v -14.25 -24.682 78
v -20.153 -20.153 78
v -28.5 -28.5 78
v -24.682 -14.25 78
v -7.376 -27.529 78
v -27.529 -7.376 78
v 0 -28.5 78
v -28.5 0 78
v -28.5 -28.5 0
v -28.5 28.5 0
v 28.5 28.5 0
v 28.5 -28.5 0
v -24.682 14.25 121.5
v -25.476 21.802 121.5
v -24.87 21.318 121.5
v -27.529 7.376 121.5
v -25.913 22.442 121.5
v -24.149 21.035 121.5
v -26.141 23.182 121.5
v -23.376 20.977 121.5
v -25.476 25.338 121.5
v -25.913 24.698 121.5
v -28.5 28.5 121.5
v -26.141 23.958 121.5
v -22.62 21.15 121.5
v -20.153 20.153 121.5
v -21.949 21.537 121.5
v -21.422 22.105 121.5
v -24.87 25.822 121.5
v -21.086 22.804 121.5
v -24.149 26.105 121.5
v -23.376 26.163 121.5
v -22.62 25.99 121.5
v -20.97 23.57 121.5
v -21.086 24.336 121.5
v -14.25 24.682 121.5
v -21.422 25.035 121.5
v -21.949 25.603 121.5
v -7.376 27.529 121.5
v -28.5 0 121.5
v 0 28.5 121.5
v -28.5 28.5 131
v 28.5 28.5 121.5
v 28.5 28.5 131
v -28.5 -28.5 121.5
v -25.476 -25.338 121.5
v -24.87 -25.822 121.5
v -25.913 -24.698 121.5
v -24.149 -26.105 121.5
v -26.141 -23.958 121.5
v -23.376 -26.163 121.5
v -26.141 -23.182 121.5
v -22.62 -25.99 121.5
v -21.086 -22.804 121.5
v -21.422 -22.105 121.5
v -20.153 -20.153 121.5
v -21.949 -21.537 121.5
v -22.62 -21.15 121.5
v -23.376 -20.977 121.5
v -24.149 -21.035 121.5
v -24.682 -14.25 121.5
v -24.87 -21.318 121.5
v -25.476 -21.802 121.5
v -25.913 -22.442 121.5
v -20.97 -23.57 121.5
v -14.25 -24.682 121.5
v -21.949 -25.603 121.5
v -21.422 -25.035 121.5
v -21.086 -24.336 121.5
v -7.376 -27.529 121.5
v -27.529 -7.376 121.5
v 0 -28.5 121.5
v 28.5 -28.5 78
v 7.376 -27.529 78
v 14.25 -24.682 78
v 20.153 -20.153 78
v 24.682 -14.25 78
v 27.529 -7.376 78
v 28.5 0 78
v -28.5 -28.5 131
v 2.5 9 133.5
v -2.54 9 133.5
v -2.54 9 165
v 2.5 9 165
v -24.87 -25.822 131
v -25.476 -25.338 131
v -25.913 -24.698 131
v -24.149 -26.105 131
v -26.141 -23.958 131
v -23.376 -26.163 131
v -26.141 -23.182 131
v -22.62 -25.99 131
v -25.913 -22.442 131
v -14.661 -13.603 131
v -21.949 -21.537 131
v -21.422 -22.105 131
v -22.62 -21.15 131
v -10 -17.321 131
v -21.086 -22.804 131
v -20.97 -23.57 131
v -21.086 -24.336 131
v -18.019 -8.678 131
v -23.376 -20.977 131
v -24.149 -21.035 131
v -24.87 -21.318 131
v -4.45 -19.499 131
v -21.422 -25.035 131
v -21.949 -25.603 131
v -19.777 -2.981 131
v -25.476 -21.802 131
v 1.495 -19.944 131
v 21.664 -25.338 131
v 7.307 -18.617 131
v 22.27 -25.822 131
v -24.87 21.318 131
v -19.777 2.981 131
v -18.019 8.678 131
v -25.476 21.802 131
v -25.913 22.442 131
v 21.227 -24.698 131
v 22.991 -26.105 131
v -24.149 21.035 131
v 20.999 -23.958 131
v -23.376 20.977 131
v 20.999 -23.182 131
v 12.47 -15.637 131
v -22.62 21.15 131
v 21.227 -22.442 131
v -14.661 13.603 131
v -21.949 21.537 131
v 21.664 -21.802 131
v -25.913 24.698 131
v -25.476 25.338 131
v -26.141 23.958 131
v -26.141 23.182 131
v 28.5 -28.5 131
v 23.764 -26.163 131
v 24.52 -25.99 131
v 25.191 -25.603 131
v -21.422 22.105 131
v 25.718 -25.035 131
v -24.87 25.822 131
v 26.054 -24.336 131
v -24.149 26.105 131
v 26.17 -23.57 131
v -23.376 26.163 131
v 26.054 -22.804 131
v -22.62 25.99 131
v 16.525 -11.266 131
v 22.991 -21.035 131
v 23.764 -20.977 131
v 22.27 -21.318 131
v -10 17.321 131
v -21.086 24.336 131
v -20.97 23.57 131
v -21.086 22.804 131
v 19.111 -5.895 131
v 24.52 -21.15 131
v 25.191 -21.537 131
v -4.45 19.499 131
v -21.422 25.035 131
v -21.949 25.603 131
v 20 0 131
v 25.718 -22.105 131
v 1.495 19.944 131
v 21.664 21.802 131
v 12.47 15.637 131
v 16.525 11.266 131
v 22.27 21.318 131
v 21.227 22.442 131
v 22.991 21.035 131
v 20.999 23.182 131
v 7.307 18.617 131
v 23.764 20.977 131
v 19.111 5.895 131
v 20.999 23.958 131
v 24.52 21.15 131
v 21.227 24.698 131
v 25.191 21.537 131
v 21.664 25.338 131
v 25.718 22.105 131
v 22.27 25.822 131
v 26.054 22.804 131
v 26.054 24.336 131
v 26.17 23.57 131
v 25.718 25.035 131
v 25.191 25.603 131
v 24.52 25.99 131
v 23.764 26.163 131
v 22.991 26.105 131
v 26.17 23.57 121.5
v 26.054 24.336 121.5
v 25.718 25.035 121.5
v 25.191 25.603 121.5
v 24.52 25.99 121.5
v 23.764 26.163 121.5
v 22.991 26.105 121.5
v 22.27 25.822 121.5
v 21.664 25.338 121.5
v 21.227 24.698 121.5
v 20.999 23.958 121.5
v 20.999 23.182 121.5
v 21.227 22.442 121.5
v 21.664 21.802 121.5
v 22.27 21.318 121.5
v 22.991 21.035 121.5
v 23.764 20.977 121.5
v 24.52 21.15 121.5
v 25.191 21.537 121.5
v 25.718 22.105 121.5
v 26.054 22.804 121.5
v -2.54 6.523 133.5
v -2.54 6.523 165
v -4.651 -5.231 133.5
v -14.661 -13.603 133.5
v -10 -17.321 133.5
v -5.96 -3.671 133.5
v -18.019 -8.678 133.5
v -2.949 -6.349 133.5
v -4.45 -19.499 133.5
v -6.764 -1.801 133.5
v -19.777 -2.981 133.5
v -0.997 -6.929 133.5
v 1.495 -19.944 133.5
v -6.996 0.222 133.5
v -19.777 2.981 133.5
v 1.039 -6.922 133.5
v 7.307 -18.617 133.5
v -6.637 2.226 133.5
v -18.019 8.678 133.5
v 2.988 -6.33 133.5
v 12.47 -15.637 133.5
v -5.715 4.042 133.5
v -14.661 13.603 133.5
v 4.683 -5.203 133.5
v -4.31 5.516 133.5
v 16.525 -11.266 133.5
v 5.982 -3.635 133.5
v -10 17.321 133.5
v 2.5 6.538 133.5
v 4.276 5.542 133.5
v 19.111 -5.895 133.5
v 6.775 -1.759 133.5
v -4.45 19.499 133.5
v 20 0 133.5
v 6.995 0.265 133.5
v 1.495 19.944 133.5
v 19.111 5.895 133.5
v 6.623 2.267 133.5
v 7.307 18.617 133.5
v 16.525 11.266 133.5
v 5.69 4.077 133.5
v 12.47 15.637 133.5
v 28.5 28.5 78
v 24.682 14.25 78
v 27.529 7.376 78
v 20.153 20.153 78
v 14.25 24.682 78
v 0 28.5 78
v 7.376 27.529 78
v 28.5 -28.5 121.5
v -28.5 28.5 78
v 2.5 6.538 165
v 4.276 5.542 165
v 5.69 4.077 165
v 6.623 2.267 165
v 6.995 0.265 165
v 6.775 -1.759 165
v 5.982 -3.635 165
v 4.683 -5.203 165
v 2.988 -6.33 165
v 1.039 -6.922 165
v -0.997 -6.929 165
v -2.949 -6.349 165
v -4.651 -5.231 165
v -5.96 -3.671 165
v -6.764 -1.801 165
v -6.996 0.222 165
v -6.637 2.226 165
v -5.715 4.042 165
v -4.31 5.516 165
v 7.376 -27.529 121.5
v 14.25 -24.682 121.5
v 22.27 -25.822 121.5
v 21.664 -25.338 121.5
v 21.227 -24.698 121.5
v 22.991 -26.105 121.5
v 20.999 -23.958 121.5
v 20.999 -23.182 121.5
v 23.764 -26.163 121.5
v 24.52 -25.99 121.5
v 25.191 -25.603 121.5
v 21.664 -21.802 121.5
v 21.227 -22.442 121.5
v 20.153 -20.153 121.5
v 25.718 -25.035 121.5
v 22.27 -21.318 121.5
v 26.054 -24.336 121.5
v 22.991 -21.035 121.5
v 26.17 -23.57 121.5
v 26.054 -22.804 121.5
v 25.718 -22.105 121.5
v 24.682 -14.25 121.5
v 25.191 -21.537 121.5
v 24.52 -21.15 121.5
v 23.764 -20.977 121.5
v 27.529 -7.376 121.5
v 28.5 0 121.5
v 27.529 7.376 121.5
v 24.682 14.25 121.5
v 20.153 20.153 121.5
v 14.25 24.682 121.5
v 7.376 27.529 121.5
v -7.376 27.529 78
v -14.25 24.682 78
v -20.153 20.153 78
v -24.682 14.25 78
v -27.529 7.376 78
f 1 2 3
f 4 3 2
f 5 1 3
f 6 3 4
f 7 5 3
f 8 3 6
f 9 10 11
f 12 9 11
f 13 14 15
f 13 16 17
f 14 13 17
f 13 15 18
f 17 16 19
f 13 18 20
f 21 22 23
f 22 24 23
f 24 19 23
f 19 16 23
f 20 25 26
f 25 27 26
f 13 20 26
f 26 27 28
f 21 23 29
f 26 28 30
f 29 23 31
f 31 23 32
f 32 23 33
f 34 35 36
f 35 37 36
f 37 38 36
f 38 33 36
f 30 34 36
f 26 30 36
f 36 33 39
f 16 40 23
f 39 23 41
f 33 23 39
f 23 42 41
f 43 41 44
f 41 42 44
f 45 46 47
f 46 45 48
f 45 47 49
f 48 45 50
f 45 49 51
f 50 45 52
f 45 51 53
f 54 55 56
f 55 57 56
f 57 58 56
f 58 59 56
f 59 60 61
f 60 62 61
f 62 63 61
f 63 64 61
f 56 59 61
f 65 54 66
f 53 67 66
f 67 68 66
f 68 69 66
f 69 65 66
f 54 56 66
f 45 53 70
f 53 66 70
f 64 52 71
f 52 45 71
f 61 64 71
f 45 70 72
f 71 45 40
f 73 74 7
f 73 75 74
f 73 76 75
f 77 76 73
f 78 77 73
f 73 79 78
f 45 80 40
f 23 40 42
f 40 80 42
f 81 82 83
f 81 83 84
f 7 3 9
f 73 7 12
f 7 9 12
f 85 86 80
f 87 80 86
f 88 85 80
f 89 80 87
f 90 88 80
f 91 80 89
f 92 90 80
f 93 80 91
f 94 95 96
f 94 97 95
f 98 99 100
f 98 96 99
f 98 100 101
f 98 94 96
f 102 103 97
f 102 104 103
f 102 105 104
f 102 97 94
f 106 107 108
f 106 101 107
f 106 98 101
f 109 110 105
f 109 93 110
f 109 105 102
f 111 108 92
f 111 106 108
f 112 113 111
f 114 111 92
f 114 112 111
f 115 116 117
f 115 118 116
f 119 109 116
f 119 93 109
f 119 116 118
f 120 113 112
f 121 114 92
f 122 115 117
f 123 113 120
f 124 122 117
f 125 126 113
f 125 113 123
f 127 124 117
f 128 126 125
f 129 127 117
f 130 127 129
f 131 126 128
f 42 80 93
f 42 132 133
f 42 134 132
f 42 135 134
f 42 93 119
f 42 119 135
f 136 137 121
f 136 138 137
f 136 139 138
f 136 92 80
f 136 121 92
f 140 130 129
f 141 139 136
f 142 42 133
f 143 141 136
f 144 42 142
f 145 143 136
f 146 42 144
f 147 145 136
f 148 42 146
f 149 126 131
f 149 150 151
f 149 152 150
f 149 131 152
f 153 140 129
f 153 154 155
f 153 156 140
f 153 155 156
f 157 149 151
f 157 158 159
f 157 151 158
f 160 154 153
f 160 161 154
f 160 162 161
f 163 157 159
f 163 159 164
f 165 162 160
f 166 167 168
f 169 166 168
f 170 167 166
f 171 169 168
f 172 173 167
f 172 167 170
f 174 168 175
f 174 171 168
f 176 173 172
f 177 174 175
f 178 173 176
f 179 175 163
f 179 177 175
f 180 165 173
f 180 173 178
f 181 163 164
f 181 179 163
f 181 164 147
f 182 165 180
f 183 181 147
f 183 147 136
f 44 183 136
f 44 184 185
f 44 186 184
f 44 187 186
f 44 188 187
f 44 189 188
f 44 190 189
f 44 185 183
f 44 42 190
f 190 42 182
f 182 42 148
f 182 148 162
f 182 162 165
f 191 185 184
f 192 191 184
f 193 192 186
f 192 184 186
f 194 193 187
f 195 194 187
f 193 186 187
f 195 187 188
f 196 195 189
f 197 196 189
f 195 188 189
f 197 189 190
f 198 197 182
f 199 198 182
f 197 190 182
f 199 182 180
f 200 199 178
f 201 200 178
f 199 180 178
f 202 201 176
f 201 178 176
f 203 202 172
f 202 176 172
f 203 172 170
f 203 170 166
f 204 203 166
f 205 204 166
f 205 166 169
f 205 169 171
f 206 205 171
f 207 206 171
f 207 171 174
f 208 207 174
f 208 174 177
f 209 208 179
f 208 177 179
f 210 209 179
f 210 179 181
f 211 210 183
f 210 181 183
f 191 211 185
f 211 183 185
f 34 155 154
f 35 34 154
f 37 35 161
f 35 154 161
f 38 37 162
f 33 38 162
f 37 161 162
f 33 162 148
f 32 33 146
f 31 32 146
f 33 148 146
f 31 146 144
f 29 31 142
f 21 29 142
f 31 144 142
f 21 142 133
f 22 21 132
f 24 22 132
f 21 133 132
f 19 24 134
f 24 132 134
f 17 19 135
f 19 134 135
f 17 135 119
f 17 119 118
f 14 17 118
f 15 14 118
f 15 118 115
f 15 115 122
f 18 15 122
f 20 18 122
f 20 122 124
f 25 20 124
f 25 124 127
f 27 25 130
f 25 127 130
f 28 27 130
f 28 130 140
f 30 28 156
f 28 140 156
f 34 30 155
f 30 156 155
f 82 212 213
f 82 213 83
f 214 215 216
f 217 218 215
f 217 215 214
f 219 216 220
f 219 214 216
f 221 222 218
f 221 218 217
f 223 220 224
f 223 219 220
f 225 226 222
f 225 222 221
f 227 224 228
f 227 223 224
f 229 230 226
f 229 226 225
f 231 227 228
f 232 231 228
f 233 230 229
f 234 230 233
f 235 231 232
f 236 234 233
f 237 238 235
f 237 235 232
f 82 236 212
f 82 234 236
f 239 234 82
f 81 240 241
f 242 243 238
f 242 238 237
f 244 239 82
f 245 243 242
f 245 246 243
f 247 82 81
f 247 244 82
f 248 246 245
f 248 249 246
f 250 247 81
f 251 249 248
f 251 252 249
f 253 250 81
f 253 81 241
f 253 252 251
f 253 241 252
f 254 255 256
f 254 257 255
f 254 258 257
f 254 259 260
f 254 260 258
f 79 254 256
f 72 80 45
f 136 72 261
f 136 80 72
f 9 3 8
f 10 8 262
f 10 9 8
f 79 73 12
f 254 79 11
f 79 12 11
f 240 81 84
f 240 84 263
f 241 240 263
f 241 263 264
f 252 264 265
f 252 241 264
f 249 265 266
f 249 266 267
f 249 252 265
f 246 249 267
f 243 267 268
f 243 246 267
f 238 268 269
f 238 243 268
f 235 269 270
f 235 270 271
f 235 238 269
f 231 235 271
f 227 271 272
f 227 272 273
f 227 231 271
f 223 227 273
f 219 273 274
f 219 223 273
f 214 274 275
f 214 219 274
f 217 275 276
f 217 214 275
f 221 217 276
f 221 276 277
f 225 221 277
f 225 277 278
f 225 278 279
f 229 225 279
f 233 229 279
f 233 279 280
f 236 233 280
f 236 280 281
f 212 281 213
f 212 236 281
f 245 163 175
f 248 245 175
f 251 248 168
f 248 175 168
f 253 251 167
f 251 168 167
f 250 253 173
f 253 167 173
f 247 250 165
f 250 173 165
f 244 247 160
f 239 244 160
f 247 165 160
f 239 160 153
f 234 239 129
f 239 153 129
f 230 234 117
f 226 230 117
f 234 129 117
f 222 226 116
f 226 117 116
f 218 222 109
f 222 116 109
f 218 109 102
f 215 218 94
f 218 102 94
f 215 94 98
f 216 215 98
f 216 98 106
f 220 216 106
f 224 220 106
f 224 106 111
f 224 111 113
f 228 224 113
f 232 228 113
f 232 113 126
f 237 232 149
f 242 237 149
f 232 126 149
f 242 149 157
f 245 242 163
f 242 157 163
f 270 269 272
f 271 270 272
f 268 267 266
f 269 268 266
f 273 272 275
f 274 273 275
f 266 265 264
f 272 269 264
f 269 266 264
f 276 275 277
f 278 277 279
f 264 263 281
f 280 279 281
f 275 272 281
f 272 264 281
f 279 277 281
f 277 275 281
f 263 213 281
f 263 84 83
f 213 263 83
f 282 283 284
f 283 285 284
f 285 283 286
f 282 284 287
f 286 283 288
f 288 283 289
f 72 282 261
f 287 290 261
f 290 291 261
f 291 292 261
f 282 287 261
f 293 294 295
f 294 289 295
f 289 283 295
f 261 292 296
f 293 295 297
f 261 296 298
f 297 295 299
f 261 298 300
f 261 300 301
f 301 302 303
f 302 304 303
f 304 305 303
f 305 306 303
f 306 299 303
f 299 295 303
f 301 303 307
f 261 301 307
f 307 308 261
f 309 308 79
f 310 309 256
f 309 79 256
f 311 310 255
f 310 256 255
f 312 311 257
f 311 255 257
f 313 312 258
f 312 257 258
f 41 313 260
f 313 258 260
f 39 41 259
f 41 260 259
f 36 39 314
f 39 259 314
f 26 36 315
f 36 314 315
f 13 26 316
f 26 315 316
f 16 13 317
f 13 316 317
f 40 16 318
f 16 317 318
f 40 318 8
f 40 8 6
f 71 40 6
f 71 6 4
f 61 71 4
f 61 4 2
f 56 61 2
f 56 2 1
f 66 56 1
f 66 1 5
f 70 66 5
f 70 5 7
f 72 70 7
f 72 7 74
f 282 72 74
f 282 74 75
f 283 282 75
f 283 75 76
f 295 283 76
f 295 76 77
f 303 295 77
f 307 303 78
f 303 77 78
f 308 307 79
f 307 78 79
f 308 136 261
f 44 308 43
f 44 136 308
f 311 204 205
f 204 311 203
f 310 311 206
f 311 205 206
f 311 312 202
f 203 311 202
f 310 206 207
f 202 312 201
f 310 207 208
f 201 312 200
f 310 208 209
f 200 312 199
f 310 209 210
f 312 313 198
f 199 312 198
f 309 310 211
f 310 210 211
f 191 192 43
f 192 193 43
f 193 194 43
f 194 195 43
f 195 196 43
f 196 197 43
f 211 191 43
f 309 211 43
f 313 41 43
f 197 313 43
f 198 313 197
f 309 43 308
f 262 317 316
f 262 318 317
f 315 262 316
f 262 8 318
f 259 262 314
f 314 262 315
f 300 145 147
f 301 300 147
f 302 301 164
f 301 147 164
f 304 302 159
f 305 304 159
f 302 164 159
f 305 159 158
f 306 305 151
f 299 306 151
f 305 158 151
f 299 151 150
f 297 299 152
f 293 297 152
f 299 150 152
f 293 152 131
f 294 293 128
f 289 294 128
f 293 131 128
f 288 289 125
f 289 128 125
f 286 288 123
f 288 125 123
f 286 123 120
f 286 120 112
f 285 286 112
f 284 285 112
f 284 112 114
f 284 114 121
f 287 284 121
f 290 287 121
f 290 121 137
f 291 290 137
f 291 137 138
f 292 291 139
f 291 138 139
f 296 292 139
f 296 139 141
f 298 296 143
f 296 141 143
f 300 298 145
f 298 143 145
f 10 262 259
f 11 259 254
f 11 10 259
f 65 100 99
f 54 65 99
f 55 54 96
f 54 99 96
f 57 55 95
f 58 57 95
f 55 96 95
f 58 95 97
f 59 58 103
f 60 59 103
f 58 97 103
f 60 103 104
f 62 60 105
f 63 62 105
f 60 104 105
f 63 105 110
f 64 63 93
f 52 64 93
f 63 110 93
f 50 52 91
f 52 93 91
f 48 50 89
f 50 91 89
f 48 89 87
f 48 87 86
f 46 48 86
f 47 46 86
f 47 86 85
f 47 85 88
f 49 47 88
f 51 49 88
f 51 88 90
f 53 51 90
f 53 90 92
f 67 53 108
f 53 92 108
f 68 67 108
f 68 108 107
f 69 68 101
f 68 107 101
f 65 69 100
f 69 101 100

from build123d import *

# Parameters (mm, degrees)
SKETCH_1_W          = 57
SKETCH_1_H          = 57
EXTRUDE_1_DEPTH     = 78
SKETCH_2_R          = 28.5
EXTRUDE_2_DEPTH     = 53
SKETCH_3_R          = 20
EXTRUDE_3_DEPTH     = 2.5
EXTRUDE_4_DEPTH     = 31.5
SKETCH_5_R          = 2
CUT_EXTRUDE_1_DEPTH = 4
SKETCH_6_W          = 57
SKETCH_6_H          = 57
SKETCH_6_R          = 2.6
EXTRUDE_5_DEPTH     = 9.5


with BuildPart() as part:
    # 草图1 → 凸台-拉伸1 (new body)
    with BuildSketch(Plane.XY):
        Rectangle(SKETCH_1_W, SKETCH_1_H)
    extrude(amount=EXTRUDE_1_DEPTH)

    # 草图2 → 凸台-拉伸2 (add)
    with BuildSketch(Plane.XY.offset(78)):
        Circle(SKETCH_2_R)
    extrude(amount=EXTRUDE_2_DEPTH)

    # 草图3 → 凸台-拉伸3 (add)
    with BuildSketch(Plane.XY.offset(131)):
        Circle(SKETCH_3_R)
    extrude(amount=EXTRUDE_3_DEPTH)

    # 草图4 → 凸台-拉伸4 (add)
    with BuildSketch(Plane.XY.offset(133.5)):
        with BuildLine():
            Line((0, 9), (2.5, 9))
            Line((2.5, 9), (2.5, 6.538348415))
            ThreePointArc((2.5, 6.538348415), (0.021437338, -6.999967174), (-2.54, 6.522913459))
            Line((-2.54, 6.522913459), (-2.54, 9))
            Line((-2.54, 9), (0, 9))
        make_face()
    extrude(amount=EXTRUDE_4_DEPTH)

    # 草图5 → 切除-拉伸1 (cut)
    with BuildSketch(Plane.XY.offset(131)):
        with Locations((0, -17.5)):
            Circle(SKETCH_5_R)
        with Locations((-17.5, 0)):
            Circle(SKETCH_5_R)
        with Locations((0, 17.5)):
            Circle(SKETCH_5_R)
        with Locations((17.5, 0)):
            Circle(SKETCH_5_R)
    extrude(amount=-CUT_EXTRUDE_1_DEPTH, mode=Mode.SUBTRACT)

    # 草图6 → 凸台-拉伸5 (add)
    with BuildSketch(Plane.XY.offset(131)):
        Rectangle(SKETCH_6_W, SKETCH_6_H)
        with Locations((-23.57, 23.57)):
            Circle(SKETCH_6_R, mode=Mode.SUBTRACT)
        with Locations((23.57, 23.57)):
            Circle(SKETCH_6_R, mode=Mode.SUBTRACT)
        with Locations((23.57, -23.57)):
            Circle(SKETCH_6_R, mode=Mode.SUBTRACT)
        with Locations((-23.57, -23.57)):
            Circle(SKETCH_6_R, mode=Mode.SUBTRACT)
    extrude(amount=-EXTRUDE_5_DEPTH)


solid = part.part
